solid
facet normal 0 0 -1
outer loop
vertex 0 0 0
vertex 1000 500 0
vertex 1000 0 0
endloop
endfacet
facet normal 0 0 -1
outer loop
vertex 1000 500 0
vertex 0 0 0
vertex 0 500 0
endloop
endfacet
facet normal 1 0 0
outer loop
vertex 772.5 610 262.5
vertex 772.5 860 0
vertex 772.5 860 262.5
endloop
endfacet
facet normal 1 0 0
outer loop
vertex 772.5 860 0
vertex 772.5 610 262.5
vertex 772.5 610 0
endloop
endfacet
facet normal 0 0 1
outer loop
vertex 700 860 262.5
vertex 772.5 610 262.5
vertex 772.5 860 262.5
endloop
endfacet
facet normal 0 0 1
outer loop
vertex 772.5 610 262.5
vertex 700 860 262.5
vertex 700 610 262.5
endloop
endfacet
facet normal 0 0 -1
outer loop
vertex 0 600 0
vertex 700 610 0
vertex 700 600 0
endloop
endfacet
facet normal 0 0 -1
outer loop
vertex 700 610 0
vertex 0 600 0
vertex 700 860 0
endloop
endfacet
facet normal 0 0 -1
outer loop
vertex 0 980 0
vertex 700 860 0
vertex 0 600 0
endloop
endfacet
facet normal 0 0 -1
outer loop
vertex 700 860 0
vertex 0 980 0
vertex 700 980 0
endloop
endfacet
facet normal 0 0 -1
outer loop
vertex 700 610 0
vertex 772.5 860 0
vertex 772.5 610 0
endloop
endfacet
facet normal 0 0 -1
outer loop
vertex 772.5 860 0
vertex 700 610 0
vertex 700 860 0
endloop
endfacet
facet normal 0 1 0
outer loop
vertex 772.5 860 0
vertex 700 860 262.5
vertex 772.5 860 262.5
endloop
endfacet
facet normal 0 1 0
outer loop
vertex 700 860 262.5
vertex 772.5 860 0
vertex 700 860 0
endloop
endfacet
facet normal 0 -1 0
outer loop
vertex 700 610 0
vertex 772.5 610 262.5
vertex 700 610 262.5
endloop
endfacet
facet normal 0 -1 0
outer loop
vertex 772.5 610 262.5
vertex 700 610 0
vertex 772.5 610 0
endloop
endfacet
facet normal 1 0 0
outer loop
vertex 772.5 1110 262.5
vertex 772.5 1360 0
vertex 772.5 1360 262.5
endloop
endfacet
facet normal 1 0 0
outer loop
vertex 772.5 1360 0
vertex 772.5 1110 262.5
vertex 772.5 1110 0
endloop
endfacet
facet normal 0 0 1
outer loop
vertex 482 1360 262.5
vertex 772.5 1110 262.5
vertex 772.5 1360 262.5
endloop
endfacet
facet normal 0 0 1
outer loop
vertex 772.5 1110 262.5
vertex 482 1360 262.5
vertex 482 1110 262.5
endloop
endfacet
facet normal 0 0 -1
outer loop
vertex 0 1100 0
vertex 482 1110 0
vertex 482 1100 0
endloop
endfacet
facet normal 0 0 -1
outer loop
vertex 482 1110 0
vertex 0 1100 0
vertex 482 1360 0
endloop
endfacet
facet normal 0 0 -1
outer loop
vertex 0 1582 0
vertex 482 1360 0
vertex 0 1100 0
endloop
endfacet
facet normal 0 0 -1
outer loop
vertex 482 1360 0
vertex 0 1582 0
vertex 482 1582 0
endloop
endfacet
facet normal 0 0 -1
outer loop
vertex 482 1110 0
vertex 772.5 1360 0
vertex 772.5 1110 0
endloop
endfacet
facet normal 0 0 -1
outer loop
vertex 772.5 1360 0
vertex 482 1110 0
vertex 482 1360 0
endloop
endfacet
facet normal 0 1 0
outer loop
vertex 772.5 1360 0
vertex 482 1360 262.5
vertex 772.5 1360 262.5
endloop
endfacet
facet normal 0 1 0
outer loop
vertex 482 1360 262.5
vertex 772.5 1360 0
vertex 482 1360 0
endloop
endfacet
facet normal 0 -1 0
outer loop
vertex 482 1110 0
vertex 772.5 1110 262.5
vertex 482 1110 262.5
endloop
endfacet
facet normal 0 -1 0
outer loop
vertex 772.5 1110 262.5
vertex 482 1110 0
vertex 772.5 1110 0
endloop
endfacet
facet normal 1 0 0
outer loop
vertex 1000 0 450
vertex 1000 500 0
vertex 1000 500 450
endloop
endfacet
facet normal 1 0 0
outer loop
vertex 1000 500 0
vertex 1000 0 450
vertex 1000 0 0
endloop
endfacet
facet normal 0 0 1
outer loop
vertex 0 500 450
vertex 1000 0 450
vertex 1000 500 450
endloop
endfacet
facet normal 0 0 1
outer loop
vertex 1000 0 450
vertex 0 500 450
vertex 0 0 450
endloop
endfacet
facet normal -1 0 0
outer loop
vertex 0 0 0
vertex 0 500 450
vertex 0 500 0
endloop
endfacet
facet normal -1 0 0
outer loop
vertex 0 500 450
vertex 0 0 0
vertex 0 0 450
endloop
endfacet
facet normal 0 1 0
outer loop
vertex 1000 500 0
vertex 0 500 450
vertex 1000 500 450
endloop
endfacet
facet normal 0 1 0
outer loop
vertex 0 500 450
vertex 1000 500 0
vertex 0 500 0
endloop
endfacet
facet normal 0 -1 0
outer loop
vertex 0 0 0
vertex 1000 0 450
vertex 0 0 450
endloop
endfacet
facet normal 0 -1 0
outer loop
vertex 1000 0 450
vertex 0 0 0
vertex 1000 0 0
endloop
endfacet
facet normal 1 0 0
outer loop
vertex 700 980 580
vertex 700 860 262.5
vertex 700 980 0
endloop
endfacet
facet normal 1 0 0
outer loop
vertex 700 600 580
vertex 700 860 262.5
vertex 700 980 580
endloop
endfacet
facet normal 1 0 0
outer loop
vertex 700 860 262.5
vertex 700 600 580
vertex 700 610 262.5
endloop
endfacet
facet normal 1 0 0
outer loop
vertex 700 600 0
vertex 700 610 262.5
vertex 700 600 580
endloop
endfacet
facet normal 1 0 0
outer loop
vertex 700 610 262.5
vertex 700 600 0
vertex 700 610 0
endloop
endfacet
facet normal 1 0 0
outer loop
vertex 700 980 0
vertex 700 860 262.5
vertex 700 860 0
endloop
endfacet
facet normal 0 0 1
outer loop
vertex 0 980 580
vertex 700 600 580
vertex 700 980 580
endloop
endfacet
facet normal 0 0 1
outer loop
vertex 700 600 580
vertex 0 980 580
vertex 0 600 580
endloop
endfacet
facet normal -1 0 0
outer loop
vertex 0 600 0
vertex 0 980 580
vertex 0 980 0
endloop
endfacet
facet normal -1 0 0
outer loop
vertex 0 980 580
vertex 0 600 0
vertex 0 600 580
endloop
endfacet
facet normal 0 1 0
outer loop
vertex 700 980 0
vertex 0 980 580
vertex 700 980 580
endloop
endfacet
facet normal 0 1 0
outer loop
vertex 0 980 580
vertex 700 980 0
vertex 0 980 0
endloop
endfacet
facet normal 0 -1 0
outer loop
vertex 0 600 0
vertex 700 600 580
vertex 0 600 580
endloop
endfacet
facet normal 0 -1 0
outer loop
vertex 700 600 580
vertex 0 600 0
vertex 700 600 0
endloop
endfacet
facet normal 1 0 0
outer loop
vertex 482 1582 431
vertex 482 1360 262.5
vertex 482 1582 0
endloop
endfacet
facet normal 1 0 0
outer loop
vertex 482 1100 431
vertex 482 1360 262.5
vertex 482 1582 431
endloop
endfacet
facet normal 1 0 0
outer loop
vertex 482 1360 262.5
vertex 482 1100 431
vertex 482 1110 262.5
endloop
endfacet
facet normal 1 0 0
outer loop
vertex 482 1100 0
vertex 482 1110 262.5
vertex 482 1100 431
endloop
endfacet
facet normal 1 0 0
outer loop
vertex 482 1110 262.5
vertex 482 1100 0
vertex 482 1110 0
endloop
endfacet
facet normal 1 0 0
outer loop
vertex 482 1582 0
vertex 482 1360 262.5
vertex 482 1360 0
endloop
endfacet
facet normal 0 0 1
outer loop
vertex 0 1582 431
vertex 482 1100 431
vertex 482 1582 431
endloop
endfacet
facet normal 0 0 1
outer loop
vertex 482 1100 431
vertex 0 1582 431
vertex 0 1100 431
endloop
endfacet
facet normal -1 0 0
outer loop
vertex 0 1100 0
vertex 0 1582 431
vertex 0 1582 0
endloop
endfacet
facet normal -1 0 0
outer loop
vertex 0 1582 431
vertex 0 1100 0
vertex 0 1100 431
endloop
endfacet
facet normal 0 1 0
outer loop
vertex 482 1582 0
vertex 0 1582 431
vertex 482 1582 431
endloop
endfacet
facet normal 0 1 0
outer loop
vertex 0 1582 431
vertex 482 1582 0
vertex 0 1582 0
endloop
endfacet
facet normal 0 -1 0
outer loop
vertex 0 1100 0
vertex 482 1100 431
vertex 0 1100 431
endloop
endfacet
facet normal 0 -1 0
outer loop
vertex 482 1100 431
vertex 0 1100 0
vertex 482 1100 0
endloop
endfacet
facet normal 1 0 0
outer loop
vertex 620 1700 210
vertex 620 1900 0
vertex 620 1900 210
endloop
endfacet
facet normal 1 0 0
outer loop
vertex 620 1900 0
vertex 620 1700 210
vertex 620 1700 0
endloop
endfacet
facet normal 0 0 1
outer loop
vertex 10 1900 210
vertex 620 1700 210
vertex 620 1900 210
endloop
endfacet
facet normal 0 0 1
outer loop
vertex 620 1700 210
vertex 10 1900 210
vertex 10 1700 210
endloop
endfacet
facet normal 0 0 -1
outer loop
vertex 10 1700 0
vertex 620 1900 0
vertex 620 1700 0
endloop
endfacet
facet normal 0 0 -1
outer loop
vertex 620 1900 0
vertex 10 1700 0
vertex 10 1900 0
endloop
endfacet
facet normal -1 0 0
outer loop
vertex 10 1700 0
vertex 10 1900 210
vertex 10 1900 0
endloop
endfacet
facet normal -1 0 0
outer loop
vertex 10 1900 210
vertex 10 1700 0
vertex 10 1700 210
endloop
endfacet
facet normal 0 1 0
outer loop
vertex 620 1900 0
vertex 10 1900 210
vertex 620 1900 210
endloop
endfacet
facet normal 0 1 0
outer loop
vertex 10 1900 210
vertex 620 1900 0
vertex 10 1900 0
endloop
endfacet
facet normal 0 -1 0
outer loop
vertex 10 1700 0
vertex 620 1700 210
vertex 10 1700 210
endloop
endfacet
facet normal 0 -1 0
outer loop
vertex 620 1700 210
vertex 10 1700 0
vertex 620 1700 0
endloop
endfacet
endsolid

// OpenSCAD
// SPDX-License-Identifier: CERN-OHL-W-2.0
// Hull envelope vs. SLS/MJF build volumes (mm). Envelope = bounding box only,
// NOT the hull geometry. 24 in dims from measured shell STL extents (approx.).
scale_k   = 1.25;          // 30 in / 24 in
hull24    = [610, 200, 210];
hull30    = hull24 * scale_k;
vol_p770  = [700, 380, 580];   // EOS P 770 (PA 2200)
vol_ht1001= [1000, 500, 450];  // Farsoon HT1001P
vol_pl    = [482, 482, 431];   // Protolabs SLS (listed)
module ghost(v, c) color(c, 0.18) cube(v);
translate([0,0,0])    ghost(vol_ht1001, "green");
translate([0,600,0])  ghost(vol_p770,   "orange");
translate([0,1100,0]) ghost(vol_pl,     "red");
for (y=[0,600,1100]) translate([10,y+10,0]) { color("blue") cube(hull30); }
translate([10,1700,0]) color("gray") cube(hull24);
